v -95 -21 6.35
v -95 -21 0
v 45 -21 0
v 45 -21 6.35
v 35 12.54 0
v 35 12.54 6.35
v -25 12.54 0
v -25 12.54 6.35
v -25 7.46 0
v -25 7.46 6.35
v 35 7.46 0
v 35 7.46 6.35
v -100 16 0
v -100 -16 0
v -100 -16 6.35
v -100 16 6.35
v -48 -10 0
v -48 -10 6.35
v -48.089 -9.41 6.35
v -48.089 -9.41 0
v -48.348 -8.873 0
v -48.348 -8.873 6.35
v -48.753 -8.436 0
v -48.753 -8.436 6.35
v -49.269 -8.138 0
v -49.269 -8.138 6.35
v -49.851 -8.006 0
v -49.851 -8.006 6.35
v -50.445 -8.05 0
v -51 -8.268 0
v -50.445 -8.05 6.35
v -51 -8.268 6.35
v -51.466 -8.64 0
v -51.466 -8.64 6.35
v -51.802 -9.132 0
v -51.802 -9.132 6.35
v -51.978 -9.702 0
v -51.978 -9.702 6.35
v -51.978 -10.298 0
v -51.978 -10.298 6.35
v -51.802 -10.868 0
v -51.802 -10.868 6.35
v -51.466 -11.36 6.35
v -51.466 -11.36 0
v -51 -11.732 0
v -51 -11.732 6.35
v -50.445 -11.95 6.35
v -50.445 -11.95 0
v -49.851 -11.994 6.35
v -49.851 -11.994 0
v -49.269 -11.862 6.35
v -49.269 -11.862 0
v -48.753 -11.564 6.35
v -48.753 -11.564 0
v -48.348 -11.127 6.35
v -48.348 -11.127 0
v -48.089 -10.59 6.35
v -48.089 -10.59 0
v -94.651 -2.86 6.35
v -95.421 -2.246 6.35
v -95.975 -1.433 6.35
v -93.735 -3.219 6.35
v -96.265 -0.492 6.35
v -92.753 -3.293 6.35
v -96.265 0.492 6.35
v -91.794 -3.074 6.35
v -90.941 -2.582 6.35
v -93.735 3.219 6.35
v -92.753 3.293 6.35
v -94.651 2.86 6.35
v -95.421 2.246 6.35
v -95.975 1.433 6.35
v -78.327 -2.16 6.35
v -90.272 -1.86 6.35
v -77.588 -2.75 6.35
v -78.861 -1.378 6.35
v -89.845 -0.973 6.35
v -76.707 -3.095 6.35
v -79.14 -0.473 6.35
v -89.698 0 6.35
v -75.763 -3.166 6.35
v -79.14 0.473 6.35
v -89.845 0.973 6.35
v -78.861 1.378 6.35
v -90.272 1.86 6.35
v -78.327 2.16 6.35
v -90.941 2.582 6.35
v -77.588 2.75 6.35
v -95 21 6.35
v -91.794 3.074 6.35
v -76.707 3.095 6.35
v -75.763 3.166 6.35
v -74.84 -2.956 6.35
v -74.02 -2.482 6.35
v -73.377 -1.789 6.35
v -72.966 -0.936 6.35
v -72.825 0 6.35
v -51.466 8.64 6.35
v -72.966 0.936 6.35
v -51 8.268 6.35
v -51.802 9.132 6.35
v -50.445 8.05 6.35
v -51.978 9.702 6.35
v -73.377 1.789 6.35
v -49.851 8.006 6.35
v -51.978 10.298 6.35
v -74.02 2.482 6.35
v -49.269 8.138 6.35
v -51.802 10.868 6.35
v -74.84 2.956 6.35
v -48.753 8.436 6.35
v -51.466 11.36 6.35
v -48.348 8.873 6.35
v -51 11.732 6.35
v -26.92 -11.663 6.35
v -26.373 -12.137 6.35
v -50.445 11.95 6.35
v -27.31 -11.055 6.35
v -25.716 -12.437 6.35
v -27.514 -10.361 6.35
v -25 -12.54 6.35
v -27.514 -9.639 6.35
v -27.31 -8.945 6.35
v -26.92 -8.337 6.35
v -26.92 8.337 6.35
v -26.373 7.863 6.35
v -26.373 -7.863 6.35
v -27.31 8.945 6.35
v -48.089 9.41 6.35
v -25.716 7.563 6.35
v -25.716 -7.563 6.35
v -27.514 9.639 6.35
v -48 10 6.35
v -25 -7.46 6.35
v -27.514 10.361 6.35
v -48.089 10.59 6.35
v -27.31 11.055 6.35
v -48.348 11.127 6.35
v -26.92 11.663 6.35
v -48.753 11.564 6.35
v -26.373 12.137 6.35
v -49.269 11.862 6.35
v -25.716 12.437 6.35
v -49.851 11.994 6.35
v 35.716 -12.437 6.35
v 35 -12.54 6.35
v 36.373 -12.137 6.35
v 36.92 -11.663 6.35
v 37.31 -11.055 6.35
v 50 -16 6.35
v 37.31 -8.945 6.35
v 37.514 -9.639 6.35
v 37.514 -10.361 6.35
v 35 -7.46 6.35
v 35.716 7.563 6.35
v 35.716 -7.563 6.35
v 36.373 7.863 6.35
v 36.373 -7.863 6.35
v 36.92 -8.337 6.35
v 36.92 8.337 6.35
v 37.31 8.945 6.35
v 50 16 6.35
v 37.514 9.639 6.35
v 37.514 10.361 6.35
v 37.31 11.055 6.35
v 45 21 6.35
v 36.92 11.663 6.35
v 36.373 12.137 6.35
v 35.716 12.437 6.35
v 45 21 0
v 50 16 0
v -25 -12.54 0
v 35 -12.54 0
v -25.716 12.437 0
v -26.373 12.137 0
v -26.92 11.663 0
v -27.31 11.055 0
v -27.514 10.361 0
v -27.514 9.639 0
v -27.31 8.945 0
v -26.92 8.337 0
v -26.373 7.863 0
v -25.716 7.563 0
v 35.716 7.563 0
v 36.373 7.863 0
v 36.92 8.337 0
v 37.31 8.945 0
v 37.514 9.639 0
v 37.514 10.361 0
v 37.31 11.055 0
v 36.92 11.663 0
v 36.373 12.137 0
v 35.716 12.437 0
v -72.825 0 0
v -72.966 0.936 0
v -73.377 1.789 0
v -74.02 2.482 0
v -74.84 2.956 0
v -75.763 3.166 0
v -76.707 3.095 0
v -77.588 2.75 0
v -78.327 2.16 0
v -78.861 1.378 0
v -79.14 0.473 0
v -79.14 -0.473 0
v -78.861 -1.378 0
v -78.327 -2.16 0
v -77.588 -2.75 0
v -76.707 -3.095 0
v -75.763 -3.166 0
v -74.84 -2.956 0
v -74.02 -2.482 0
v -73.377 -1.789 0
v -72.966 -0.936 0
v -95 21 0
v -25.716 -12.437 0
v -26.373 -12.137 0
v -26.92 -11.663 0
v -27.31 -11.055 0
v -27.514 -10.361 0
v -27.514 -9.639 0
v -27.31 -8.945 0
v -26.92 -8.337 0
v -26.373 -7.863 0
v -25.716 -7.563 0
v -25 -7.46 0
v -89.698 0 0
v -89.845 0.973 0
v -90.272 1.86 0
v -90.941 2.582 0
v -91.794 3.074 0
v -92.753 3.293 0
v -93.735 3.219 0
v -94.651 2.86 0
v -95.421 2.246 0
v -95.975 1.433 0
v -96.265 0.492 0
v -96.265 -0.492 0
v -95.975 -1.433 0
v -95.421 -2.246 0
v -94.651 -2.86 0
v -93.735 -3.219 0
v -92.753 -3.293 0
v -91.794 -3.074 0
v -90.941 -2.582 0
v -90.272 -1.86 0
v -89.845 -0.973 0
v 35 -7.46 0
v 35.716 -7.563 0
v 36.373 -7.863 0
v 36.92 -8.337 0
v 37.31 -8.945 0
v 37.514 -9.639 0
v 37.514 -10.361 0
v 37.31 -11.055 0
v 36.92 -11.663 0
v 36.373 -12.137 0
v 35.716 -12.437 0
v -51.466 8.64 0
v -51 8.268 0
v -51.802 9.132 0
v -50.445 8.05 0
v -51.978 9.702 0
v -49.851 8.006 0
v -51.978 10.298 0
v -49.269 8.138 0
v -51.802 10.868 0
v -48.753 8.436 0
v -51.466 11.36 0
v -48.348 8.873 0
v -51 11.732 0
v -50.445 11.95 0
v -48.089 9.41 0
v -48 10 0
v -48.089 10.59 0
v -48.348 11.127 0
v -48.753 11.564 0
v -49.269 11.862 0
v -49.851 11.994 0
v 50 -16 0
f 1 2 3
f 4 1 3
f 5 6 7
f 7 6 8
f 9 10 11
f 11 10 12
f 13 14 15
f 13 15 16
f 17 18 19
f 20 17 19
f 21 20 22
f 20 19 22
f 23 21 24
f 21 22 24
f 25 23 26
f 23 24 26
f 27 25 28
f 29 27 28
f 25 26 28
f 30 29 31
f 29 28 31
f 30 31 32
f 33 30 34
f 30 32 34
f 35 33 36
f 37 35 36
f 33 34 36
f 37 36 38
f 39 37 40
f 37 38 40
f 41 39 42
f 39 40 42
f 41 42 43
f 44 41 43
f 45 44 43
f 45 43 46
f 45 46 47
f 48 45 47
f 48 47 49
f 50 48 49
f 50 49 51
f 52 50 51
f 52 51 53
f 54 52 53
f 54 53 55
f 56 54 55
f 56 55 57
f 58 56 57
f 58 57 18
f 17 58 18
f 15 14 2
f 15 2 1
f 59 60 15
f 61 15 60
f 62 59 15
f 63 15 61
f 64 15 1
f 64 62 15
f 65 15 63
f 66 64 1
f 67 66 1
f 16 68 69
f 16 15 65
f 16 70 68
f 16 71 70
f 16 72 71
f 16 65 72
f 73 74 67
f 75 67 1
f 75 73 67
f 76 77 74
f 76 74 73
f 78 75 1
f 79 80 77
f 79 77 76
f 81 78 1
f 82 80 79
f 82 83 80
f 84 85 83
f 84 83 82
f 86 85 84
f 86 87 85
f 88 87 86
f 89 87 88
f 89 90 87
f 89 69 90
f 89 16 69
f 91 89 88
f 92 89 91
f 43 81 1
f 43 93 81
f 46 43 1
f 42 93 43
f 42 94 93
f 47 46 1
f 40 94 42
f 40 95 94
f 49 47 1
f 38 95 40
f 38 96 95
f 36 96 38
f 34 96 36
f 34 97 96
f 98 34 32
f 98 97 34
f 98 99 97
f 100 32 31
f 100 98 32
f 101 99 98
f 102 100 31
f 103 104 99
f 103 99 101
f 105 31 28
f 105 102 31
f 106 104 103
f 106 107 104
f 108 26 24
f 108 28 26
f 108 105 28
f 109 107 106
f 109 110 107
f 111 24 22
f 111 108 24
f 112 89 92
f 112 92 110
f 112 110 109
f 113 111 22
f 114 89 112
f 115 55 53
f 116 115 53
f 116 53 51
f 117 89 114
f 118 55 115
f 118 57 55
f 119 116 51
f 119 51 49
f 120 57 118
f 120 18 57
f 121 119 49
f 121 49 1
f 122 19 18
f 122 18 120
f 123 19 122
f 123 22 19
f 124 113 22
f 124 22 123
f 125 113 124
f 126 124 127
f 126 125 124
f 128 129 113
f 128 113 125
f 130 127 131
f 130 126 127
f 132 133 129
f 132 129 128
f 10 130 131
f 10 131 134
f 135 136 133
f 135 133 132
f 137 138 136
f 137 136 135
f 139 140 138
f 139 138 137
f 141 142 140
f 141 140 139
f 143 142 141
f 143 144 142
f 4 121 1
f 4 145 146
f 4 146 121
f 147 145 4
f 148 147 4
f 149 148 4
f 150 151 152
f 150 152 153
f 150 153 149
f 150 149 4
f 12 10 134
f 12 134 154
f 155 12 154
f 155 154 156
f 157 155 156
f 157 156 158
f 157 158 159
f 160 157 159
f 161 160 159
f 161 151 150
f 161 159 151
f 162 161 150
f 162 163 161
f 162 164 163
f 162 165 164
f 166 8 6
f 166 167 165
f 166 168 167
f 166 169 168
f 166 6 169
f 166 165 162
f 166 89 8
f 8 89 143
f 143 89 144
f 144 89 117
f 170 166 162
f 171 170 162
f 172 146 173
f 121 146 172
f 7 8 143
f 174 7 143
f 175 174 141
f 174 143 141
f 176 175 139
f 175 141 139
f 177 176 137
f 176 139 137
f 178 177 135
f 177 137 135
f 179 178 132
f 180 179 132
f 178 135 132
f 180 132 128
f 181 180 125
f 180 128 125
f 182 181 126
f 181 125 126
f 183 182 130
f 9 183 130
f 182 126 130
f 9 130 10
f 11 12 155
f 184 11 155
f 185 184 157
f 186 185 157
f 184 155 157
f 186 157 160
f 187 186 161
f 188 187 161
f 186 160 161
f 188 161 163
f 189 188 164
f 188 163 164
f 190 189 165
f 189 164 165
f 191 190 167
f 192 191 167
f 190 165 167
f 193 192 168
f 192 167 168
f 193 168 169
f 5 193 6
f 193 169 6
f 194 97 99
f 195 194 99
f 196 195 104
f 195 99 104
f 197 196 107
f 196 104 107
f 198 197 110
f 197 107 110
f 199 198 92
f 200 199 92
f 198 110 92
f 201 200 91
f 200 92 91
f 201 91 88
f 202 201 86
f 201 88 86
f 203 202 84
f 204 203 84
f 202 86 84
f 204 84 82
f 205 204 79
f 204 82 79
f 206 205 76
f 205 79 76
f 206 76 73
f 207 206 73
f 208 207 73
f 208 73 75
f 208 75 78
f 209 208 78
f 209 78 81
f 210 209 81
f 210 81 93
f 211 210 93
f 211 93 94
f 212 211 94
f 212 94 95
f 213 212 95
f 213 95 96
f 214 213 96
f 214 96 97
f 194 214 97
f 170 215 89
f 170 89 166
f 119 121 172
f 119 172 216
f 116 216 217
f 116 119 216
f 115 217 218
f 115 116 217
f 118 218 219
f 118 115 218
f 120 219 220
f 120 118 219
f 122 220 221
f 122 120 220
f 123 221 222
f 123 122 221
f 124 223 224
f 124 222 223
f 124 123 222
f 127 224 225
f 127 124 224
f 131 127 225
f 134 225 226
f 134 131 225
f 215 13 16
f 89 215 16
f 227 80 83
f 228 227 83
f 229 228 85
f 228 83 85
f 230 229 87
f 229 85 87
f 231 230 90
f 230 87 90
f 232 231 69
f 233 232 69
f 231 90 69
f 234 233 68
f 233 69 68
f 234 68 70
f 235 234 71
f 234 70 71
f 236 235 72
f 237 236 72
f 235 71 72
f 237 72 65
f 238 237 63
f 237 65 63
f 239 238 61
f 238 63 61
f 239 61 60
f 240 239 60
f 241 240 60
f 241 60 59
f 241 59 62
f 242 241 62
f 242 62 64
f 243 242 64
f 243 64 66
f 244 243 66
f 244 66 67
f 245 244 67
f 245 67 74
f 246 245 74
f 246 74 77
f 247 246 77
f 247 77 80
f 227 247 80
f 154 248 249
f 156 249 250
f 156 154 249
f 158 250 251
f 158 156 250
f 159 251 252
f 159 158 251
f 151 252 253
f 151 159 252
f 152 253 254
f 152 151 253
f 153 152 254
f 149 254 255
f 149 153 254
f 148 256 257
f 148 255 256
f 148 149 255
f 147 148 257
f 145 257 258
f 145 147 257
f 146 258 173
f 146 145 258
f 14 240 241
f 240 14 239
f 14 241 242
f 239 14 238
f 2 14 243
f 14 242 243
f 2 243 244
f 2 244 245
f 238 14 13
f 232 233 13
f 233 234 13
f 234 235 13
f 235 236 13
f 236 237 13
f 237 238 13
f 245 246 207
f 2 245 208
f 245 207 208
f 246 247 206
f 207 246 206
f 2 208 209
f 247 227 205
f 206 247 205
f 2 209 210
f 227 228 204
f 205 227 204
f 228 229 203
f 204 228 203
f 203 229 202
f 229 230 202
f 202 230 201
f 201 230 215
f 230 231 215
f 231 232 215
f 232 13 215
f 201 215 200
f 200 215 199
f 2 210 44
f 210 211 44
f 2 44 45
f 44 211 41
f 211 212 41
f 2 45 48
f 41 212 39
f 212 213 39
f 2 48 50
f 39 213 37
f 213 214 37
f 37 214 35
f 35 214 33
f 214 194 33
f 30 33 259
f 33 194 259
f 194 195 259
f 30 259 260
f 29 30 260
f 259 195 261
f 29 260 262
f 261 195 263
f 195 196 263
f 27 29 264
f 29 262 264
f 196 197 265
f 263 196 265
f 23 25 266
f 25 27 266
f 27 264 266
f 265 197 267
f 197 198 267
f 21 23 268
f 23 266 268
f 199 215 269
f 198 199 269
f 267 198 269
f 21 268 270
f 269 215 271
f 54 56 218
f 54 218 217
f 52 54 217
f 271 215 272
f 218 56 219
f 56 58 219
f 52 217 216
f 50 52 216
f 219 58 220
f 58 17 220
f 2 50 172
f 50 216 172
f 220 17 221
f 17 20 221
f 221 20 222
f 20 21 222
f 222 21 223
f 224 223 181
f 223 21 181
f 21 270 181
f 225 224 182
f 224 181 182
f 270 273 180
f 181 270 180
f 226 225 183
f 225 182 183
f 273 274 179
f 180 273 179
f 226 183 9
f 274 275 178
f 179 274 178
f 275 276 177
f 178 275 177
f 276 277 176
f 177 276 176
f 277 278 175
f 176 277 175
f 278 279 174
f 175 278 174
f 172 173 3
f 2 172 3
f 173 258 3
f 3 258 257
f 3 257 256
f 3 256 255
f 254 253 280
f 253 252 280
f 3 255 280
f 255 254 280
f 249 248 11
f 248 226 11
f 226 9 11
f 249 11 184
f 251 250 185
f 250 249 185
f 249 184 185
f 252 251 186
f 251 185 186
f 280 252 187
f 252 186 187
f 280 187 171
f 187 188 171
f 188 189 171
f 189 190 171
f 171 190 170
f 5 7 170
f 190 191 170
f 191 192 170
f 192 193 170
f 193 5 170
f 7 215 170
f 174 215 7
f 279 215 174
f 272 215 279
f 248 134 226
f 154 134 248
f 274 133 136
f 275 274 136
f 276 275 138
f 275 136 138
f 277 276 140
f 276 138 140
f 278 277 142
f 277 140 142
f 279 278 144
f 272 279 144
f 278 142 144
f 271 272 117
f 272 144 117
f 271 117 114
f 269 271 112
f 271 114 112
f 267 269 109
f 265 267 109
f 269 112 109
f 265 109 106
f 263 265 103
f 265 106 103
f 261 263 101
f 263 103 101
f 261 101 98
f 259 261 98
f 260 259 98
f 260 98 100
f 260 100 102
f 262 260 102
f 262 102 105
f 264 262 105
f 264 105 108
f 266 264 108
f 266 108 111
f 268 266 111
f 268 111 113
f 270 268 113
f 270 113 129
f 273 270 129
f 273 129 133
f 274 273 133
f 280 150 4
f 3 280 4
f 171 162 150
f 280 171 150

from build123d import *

# Parameters (mm, degrees)
SKETCH1_W           = 200
SKETCH1_H           = 42
BOSS_EXTRUDE1_DEPTH = 6.35
SKETCH3_R           = 2
CUT_EXTRUDE2_DEPTH  = 7.35
SKETCH4_R           = 3.175
CUT_EXTRUDE3_DEPTH  = 7.35
CHAMFER1_SIZE       = 5
SKETCH9_R           = 3.175
CUT_EXTRUDE8_DEPTH  = 7.35
SKETCH10_R          = 12.5
CUT_EXTRUDE9_DEPTH  = 7.35
SKETCH12_R          = 3.302
CUT_EXTRUDE11_DEPTH = 7.35
SKETCH13_R          = 12.5
CUT_EXTRUDE12_DEPTH = 10


with BuildPart() as part:
    # Sketch1 → Boss-Extrude1 (new body)
    with BuildSketch(Plane.XY):
        Rectangle(SKETCH1_W, SKETCH1_H)
    extrude(amount=BOSS_EXTRUDE1_DEPTH)

    # Sketch3 → Cut-Extrude2 (cut, through all)
    with BuildSketch(Plane.XY.offset(6.35)):
        with Locations((-50, 10)):
            Circle(SKETCH3_R)
        with Locations((-50, -10)):
            Circle(SKETCH3_R)
    extrude(amount=-CUT_EXTRUDE2_DEPTH, mode=Mode.SUBTRACT)

    # Sketch4 → Cut-Extrude3 (cut, through all)
    with BuildSketch(Plane.XY.offset(6.35)):
        with Locations((-76, 0)):
            Circle(SKETCH4_R)
    extrude(amount=-CUT_EXTRUDE3_DEPTH, mode=Mode.SUBTRACT)

    # Chamfer1
    chamfer1_edges = [part.edges().sort_by_distance(p)[0] for p in [
        (100, -21, 3.175),
        (-100, -21, 3.175),
        (-100, 21, 3.175),
        (100, 21, 3.175),
    ]]
    chamfer(chamfer1_edges, length=CHAMFER1_SIZE)

    # Sketch9 → Cut-Extrude8 (cut, through all)
    with BuildSketch(Plane.XY.offset(6.35)):
        with Locations((80, 0)):
            Circle(SKETCH9_R)
    extrude(amount=-CUT_EXTRUDE8_DEPTH, mode=Mode.SUBTRACT)

    # Sketch10 → Cut-Extrude9 (cut, through all)
    with BuildSketch(Plane.XY.offset(6.35)):
        with Locations((80, 0)):
            Circle(SKETCH10_R)
    extrude(amount=-CUT_EXTRUDE9_DEPTH, mode=Mode.SUBTRACT)

    # Sketch12 → Cut-Extrude11 (cut, through all)
    with BuildSketch(Plane.XY.offset(6.35)):
        with Locations((-93, 0)):
            Circle(SKETCH12_R)
    extrude(amount=-CUT_EXTRUDE11_DEPTH, mode=Mode.SUBTRACT)

    # Sketch13 → Cut-Extrude12 (cut)
    with BuildSketch(Plane.XY.offset(6.35)):
        Polygon((45, 21), (50, 16), (50, -16), (45, -21), (95, -21), (100, -16), (100, 16), (95, 21), align=None)
        with Locations((80, 0)):
            Circle(SKETCH13_R, mode=Mode.SUBTRACT)
        with BuildLine():
            Line((-25, 7.46), (35, 7.46))
            ThreePointArc((35, 7.46), (37.54, 10), (35, 12.54))
            Line((35, 12.54), (-25, 12.54))
            ThreePointArc((-25, 12.54), (-27.54, 10), (-25, 7.46))
        make_face()
        with BuildLine():
            ThreePointArc((35, -7.46), (37.54, -10), (35, -12.54))
            Line((35, -12.54), (-25, -12.54))
            ThreePointArc((-25, -12.54), (-27.54, -10), (-25, -7.46))
            Line((-25, -7.46), (35, -7.46))
        make_face()
    extrude(amount=-CUT_EXTRUDE12_DEPTH, mode=Mode.SUBTRACT)


solid = part.part
